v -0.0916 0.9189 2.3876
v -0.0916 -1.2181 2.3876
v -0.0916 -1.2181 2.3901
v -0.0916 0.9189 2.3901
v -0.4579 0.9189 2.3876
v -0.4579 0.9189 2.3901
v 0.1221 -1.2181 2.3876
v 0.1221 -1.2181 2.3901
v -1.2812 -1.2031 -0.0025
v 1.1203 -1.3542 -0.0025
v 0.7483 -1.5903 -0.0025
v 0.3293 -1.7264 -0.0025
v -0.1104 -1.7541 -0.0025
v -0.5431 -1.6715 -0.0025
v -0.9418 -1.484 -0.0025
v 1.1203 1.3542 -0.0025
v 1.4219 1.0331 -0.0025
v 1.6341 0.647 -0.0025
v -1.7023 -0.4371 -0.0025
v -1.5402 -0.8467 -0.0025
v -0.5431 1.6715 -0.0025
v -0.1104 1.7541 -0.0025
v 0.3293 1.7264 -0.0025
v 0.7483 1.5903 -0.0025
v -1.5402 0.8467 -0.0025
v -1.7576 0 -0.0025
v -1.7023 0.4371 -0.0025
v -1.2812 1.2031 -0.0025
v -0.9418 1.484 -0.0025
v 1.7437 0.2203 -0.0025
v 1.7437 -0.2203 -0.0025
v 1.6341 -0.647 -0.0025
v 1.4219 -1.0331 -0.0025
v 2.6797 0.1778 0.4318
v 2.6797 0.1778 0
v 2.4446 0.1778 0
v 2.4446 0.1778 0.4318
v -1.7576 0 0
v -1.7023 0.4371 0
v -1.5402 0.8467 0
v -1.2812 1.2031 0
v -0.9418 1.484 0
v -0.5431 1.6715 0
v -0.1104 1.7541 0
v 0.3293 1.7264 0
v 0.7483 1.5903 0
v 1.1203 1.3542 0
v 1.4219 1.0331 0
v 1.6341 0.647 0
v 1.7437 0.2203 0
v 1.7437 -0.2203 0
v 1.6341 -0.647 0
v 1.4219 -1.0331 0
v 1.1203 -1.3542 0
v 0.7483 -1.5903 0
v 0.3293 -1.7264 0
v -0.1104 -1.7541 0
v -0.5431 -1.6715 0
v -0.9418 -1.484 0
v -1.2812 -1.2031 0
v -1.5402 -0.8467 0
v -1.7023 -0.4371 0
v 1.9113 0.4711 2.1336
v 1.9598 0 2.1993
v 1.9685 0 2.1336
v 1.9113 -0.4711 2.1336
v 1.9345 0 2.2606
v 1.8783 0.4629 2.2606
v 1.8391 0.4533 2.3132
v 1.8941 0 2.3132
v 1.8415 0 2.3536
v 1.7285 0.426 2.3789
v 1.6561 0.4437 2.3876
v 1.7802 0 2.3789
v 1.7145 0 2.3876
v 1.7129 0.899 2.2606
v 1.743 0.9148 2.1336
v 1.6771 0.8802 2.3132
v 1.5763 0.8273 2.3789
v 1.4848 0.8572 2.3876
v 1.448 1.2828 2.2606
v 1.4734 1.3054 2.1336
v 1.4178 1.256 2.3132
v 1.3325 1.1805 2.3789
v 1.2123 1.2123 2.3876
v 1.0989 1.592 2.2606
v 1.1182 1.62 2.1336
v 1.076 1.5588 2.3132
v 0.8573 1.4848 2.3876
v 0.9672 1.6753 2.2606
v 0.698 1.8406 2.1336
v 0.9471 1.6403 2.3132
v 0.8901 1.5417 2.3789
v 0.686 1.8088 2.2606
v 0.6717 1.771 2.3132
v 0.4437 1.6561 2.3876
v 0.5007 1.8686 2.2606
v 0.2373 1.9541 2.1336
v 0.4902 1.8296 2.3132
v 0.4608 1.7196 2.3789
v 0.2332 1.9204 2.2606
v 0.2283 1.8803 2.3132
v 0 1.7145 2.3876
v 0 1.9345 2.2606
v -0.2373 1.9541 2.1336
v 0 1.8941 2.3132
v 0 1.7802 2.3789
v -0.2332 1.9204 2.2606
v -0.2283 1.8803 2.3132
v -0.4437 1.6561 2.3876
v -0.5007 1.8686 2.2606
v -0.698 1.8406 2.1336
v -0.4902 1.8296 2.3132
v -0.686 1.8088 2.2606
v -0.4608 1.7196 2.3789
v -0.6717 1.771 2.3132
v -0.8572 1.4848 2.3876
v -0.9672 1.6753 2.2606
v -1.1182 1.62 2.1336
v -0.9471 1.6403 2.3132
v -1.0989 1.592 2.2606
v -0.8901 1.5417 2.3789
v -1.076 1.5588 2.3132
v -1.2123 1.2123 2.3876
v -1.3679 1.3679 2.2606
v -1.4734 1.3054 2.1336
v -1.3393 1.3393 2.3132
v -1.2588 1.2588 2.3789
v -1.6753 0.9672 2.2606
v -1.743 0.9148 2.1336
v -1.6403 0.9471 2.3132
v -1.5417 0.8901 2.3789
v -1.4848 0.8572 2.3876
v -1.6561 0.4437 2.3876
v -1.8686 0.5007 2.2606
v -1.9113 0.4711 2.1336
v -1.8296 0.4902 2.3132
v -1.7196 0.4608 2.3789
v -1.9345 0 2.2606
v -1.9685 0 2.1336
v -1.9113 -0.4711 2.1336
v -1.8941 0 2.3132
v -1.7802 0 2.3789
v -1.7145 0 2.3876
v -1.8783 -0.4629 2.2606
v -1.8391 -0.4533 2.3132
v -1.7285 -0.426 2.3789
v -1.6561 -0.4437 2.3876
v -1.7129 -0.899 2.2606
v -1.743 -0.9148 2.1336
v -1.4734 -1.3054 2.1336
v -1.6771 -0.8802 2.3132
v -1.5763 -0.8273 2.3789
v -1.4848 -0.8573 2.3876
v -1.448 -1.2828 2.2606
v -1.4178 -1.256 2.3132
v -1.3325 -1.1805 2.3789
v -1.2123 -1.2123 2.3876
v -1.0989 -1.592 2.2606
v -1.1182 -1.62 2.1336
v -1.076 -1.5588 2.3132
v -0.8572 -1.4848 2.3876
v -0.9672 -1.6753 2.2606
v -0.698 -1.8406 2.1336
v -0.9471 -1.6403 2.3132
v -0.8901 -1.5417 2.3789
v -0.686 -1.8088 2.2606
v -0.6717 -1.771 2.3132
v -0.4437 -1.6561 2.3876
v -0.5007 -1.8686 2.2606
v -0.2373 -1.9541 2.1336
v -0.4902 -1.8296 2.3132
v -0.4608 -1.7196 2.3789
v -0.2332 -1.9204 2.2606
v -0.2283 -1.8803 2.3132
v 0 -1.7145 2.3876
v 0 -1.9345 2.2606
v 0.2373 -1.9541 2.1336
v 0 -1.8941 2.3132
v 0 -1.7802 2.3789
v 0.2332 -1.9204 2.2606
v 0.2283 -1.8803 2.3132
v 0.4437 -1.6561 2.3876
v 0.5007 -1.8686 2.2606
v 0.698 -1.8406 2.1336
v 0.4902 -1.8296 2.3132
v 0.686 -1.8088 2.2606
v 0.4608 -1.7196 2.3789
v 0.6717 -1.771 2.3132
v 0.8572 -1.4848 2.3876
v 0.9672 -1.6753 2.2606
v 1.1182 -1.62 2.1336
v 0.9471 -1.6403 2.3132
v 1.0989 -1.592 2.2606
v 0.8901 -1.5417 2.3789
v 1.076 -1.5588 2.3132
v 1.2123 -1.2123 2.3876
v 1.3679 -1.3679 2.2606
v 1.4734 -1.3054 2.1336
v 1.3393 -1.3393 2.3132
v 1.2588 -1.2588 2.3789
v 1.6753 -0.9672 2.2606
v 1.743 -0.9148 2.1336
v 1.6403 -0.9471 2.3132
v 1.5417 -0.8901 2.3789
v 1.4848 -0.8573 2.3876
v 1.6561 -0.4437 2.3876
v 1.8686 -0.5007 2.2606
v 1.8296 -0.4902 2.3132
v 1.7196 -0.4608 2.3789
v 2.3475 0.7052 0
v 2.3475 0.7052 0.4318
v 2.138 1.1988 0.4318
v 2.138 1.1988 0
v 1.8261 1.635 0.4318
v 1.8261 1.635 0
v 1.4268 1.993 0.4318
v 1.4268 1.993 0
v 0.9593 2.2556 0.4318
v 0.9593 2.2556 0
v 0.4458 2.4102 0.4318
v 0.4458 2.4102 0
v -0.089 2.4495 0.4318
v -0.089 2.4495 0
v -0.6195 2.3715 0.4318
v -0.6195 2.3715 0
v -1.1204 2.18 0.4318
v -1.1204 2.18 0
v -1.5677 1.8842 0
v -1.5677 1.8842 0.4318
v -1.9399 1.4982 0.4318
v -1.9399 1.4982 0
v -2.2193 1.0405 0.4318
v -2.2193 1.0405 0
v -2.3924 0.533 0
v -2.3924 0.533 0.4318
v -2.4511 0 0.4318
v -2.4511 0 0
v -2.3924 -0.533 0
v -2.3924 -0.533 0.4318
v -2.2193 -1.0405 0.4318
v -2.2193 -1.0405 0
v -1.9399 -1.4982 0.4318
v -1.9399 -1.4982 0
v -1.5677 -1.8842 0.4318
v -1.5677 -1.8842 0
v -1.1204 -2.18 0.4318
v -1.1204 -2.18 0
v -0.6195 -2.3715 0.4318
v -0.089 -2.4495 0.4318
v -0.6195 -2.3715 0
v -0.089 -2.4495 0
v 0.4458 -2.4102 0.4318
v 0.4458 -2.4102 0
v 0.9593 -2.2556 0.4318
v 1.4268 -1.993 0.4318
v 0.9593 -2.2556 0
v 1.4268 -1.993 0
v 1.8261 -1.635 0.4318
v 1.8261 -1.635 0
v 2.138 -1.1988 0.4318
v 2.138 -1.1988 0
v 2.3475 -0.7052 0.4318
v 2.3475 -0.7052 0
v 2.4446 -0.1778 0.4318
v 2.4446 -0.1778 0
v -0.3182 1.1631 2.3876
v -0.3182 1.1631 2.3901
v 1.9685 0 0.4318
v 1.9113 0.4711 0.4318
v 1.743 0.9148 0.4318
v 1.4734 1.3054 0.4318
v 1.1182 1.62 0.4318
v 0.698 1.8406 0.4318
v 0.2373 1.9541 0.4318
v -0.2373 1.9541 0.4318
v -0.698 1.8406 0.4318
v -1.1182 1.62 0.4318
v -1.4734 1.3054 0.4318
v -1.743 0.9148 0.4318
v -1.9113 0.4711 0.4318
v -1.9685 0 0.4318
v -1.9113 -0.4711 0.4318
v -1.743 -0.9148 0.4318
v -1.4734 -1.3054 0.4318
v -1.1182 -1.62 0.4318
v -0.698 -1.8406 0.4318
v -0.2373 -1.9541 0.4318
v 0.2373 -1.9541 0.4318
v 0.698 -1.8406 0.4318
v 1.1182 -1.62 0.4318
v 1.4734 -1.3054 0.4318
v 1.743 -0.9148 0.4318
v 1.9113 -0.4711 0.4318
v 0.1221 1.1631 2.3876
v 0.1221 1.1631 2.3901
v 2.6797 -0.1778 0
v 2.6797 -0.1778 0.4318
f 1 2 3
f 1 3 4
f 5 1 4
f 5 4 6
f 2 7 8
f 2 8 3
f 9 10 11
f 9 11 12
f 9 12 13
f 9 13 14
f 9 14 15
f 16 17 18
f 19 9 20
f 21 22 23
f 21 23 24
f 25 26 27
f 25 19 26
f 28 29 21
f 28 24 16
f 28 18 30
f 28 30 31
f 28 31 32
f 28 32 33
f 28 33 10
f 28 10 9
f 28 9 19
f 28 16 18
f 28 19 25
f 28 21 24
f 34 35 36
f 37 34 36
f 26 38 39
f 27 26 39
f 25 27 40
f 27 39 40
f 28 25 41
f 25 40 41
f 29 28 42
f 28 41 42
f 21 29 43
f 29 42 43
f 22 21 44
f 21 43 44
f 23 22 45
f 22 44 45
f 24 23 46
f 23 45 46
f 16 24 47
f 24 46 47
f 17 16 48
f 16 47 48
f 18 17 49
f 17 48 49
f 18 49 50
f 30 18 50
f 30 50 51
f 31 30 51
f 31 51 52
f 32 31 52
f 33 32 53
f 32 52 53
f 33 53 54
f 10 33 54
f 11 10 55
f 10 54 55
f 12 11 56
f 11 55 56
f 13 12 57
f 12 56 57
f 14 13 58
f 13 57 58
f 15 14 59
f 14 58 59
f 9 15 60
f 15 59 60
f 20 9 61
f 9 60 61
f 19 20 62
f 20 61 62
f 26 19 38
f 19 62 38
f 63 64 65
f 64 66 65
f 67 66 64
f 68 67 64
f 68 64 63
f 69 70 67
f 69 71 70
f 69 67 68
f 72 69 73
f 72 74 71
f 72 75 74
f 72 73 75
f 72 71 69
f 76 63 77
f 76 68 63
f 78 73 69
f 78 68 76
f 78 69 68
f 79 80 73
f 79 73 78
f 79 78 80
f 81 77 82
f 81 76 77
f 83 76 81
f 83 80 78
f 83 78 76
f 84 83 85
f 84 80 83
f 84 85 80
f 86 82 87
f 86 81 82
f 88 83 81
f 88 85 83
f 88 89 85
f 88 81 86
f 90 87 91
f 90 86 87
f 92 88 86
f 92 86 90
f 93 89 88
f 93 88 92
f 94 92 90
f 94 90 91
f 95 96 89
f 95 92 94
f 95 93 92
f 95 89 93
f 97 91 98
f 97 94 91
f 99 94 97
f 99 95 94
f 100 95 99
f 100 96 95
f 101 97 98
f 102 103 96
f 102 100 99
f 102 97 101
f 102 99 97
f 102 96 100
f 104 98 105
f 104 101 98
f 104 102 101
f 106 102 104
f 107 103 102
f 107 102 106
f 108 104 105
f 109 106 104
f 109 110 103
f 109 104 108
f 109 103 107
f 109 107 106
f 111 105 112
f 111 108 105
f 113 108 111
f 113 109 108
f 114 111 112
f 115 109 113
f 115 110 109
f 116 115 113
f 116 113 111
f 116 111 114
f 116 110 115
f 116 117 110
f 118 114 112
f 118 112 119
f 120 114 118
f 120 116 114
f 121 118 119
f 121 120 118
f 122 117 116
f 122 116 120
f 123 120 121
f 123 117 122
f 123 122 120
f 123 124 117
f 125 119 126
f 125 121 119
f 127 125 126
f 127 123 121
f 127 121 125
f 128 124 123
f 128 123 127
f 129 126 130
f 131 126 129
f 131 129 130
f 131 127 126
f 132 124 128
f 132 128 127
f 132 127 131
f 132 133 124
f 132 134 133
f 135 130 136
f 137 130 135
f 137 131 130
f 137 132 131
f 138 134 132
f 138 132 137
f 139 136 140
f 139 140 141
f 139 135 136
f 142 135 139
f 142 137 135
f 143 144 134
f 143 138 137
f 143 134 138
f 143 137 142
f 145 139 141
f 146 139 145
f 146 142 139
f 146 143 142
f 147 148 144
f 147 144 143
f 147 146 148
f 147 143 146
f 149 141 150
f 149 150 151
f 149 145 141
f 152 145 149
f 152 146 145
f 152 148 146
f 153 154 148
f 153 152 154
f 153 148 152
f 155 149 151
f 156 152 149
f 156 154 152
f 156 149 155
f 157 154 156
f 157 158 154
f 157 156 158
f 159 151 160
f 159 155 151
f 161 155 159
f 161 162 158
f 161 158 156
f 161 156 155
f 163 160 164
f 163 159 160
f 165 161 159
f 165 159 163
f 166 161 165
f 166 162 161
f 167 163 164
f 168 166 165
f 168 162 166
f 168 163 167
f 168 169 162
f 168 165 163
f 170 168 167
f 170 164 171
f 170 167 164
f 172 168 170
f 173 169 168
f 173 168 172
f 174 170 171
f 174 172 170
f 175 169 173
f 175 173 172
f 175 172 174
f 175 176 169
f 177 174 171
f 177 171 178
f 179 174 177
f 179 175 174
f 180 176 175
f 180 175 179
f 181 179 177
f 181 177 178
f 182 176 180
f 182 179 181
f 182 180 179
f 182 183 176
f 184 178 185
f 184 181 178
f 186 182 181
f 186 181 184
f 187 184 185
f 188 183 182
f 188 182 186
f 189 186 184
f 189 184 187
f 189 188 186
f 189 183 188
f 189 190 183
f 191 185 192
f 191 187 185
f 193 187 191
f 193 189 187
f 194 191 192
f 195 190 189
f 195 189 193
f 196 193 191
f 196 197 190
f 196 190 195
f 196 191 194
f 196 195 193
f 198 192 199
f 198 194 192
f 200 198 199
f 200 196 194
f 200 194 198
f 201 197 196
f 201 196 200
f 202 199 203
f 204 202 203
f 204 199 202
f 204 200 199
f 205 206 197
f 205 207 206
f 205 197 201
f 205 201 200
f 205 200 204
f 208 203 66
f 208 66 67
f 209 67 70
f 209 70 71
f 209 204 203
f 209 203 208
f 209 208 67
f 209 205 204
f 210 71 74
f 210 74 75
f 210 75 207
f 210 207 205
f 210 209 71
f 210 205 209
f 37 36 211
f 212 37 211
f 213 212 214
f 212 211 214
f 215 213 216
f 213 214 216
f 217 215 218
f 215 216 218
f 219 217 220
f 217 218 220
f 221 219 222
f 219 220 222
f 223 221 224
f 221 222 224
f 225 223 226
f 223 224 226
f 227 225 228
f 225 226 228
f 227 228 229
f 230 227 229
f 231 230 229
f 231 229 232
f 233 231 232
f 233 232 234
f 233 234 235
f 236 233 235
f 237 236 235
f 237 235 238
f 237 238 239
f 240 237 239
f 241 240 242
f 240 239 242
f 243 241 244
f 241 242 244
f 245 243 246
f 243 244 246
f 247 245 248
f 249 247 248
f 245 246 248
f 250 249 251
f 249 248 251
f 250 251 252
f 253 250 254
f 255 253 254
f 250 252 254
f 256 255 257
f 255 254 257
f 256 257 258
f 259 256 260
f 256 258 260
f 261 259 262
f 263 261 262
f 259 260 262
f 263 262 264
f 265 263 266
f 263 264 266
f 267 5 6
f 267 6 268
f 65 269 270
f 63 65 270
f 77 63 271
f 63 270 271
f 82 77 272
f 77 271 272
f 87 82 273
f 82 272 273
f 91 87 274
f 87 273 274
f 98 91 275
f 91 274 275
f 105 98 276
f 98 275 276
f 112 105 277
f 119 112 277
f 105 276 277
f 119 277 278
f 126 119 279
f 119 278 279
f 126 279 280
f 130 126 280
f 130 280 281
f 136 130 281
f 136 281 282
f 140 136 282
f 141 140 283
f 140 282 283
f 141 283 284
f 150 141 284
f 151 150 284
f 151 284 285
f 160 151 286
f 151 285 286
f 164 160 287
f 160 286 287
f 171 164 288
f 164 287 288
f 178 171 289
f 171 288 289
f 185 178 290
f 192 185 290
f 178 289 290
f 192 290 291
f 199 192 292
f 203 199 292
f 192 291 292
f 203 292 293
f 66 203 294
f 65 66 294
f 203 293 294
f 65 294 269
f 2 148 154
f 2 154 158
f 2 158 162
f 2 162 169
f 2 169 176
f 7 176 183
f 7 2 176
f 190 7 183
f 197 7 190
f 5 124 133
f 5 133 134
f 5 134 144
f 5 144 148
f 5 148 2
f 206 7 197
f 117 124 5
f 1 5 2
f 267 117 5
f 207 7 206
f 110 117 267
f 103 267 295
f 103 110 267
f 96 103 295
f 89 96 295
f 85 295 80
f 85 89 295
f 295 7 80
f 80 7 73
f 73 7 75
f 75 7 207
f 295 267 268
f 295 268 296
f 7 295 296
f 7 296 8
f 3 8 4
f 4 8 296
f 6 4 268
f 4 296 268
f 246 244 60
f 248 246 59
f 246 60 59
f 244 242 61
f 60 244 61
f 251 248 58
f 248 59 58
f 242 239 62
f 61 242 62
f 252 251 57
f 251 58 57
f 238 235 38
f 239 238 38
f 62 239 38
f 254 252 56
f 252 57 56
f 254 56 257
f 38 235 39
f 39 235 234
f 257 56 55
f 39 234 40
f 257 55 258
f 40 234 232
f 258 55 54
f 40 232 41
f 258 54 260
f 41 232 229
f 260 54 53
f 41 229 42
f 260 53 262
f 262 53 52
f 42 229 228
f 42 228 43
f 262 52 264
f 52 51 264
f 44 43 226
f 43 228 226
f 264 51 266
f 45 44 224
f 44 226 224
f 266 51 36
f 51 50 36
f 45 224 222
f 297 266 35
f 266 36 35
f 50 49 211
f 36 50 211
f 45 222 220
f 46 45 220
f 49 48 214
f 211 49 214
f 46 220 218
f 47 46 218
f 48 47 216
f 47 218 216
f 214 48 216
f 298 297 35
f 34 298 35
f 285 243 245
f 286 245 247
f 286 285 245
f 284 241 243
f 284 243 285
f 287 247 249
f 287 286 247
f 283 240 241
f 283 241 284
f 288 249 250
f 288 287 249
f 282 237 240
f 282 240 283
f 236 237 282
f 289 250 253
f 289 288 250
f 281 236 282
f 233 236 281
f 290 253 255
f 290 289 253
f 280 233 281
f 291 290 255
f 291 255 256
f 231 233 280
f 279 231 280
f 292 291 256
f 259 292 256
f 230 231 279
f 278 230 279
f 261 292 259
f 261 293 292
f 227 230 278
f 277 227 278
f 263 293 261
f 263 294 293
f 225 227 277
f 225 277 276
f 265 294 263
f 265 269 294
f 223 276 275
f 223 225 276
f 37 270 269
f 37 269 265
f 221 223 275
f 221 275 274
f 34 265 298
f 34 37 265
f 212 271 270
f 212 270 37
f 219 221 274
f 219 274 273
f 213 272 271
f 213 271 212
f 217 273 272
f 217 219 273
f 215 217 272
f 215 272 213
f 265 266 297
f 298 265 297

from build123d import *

# Parameters (mm, degrees)
BOSS_EXTRUDE1_DEPTH = 0.4318
SKETCH2_R           = 1.9685
BOSS_EXTRUDE2_DEPTH = 1.9558
SKETCH3_R           = 1.757566481
BOSS_EXTRUDE3_DEPTH = 0.00254
FILLET1_R           = 0.254
BOSS_EXTRUDE4_DEPTH = 0.00254


with BuildPart() as part:
    # Sketch1 → Boss-Extrude1 (new body)
    with BuildSketch(Plane.XY):
        with BuildLine():
            Line((2.6797, 0.1778), (2.4511, 0.1778))
            Line((2.4511, 0.1778), (2.44464279, 0.1778))
            ThreePointArc((2.44464279, 0.1778), (-2.4511, 0), (2.44464279, -0.1778))
            Line((2.44464279, -0.1778), (2.4511, -0.1778))
            Line((2.4511, -0.1778), (2.6797, -0.1778))
            Line((2.6797, -0.1778), (2.6797, 0.1778))
        make_face()
    extrude(amount=BOSS_EXTRUDE1_DEPTH)

    # Sketch2 → Boss-Extrude2 (add)
    with BuildSketch(Plane.XY.offset(0.4318)):
        Circle(SKETCH2_R)
    extrude(amount=BOSS_EXTRUDE2_DEPTH)

    # Sketch3 → Boss-Extrude3 (add)
    with BuildSketch(Plane(origin=(0, 0, 0), x_dir=(-1, 0, 0), z_dir=(0, 0, -1))):
        Circle(SKETCH3_R)
    extrude(amount=BOSS_EXTRUDE3_DEPTH)

    # Fillet1
    fillet1_edges = [part.edges().sort_by_distance(p)[0] for p in [
        (-1.9685, 0, 2.3876),
    ]]
    fillet(fillet1_edges, radius=FILLET1_R)

    # Sketch4 → Boss-Extrude4 (add)
    with BuildSketch(Plane.XY.offset(2.3876)):
        Polygon((-0.318167819, 1.163108793), (0.122115385, 1.163108793), (0.122115385, -1.218141207), (-0.091586538, -1.218141207), (-0.091586538, 0.918878024), (-0.457932692, 0.918878024), align=None)
    extrude(amount=BOSS_EXTRUDE4_DEPTH)


solid = part.part
